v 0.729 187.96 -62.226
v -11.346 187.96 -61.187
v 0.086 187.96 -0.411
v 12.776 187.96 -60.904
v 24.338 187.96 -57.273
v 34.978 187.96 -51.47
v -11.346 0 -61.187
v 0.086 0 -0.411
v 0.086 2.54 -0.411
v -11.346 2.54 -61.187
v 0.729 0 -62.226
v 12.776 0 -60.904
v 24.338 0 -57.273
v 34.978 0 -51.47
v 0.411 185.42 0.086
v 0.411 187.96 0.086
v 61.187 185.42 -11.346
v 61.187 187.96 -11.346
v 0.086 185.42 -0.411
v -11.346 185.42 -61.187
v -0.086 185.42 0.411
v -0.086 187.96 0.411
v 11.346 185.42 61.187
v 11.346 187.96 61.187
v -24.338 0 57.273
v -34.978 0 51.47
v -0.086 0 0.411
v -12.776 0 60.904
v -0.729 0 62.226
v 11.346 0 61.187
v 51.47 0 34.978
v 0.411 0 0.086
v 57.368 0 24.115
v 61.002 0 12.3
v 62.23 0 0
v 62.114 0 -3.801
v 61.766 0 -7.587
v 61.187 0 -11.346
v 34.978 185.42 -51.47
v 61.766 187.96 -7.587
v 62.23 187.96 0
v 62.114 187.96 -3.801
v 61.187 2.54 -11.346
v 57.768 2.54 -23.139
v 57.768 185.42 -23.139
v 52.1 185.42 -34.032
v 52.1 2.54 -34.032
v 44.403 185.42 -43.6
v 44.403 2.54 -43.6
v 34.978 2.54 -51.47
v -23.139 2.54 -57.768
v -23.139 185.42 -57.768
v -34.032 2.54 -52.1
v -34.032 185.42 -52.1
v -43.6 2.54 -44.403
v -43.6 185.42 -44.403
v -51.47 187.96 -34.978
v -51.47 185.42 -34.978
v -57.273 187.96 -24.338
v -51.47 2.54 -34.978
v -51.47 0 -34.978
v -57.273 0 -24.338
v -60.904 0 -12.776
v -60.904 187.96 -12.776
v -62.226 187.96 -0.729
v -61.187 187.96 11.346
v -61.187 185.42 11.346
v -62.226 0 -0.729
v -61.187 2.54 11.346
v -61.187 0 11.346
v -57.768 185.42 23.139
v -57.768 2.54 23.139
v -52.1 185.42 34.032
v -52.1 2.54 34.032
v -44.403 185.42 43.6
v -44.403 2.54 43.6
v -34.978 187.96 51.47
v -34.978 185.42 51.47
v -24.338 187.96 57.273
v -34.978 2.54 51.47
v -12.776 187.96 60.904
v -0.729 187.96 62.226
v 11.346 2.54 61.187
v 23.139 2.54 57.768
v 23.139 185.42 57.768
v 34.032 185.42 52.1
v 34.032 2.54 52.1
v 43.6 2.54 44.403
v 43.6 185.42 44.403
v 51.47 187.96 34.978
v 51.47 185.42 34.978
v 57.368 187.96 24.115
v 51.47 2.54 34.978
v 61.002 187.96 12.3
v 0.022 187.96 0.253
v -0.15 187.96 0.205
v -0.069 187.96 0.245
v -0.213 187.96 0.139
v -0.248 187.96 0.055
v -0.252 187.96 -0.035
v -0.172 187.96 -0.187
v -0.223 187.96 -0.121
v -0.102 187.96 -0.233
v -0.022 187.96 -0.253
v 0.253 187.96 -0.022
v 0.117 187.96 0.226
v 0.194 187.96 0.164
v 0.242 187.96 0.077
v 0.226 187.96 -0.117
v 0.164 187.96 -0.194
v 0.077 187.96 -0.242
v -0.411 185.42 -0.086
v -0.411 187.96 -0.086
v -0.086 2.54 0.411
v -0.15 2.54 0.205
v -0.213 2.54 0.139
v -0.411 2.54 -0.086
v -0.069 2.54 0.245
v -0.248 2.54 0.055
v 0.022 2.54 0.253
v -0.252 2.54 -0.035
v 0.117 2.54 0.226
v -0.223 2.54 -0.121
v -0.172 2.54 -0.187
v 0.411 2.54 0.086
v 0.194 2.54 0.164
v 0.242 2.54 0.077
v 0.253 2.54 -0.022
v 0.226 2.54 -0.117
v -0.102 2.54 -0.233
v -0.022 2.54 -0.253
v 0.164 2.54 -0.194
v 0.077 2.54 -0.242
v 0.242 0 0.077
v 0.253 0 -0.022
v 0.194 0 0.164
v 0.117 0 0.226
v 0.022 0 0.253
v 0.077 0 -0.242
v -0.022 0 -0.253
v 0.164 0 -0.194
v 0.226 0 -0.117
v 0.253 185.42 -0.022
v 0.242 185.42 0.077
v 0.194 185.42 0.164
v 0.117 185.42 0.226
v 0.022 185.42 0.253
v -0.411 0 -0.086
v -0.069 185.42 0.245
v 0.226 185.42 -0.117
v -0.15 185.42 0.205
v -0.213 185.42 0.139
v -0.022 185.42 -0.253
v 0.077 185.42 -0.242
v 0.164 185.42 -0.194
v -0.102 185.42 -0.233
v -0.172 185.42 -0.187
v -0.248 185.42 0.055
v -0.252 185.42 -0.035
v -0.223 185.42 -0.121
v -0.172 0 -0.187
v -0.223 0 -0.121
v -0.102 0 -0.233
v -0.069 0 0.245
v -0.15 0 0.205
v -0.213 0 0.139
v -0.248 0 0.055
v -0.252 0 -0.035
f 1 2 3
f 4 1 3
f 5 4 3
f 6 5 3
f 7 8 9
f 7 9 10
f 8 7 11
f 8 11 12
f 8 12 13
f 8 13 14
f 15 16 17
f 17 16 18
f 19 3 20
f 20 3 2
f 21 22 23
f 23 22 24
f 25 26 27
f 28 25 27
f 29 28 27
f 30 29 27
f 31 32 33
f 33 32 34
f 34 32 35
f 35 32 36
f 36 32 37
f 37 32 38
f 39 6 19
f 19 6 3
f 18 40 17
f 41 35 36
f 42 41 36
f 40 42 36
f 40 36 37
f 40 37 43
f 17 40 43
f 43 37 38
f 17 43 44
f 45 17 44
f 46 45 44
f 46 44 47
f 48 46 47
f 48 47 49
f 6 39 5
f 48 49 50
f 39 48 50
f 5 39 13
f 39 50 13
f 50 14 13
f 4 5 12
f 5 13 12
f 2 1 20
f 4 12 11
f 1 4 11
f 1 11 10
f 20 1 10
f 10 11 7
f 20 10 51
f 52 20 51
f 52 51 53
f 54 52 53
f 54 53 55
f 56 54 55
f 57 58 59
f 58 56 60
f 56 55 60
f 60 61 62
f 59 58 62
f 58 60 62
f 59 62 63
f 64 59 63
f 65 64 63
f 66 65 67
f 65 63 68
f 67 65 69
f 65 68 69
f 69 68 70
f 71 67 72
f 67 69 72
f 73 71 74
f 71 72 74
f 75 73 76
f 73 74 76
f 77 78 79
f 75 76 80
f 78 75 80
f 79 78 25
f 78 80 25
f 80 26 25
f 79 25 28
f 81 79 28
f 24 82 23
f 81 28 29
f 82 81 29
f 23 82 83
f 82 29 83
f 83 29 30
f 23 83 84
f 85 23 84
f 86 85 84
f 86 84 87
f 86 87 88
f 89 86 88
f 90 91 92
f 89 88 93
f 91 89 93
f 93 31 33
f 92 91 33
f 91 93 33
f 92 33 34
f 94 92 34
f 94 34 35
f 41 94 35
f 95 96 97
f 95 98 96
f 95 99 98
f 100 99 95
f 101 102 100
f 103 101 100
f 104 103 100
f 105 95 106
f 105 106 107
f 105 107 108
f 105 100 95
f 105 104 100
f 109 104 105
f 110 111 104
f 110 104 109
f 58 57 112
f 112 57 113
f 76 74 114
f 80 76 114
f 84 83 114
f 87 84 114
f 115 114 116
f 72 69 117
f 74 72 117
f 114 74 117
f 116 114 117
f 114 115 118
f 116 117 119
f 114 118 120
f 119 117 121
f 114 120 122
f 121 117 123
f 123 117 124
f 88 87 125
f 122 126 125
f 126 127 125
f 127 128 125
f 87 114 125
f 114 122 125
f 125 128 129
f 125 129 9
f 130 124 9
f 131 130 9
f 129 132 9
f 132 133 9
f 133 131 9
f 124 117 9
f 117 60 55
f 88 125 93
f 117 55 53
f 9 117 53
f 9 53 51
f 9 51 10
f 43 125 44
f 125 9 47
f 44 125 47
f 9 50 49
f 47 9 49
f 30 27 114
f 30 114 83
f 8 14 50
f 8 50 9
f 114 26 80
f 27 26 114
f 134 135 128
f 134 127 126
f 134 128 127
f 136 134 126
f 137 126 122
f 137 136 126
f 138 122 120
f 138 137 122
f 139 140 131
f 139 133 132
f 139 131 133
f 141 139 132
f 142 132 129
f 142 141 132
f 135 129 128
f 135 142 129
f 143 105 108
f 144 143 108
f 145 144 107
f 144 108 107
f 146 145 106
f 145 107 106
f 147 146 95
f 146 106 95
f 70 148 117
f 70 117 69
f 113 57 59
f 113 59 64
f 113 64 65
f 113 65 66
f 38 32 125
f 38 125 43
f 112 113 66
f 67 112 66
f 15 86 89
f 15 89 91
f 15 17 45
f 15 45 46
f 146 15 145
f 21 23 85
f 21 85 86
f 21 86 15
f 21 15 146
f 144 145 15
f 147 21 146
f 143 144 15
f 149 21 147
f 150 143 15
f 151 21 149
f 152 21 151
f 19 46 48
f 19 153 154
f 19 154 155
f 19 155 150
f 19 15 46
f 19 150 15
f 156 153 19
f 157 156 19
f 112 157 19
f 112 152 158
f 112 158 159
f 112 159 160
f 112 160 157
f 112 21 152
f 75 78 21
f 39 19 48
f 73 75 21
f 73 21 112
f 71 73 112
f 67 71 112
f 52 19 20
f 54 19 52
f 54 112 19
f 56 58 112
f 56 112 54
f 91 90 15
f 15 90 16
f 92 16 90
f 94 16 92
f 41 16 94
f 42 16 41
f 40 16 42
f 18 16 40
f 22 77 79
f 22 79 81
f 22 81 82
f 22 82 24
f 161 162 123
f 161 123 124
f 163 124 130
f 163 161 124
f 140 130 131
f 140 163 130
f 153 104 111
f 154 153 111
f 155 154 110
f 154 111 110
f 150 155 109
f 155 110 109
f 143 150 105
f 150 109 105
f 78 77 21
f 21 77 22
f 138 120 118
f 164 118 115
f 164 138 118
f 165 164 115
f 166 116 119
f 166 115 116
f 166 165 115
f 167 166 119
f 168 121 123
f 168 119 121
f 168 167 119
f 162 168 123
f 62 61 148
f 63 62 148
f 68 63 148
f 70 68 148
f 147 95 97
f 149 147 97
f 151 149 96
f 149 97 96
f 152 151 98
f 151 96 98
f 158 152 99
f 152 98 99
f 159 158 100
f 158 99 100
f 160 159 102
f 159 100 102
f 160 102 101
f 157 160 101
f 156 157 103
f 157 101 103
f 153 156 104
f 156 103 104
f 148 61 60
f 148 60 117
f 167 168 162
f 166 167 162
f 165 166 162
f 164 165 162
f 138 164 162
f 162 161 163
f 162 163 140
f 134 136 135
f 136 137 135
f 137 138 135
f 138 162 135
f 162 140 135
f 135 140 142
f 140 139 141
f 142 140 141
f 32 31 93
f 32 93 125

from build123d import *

# Parameters (mm, degrees)
SKETCH1_R            = 62.23
BOSS_EXTRUDE1_DEPTH  = 187.96
CUT_EXTRUDE7_DEPTH   = 2.54
CIRPATTERN2_COUNT    = 4
MIRROR1_COPY_1_DEPTH = 2.54
MIRROR1_COPY_2_DEPTH = 2.54
MIRROR1_COPY_3_DEPTH = 2.54


with BuildPart() as part:
    # Sketch1 → Boss-Extrude1 (new body)
    with BuildSketch(Plane(origin=(0, 0, 0), x_dir=(1, 0, 0), z_dir=(0, 1, 0))):
        Circle(SKETCH1_R)
    extrude(amount=BOSS_EXTRUDE1_DEPTH)

    # Sketch2 → Cut-Extrude7 (cut)
    with BuildSketch(Plane(origin=(0, 187.96, 0), x_dir=(1, 0, 0), z_dir=(0, 1, 0))):
        with BuildLine():
            Line((-34.977816307, -51.46965384), (0.021593035, -0.253080503))
            ThreePointArc((0.021593035, -0.253080503), (-0.212652586, -0.138906004), (-0.223069042, 0.12147511))
            Line((-0.223069042, 0.12147511), (-61.186975042, -11.345791522))
            ThreePointArc((-61.186975042, -11.345791522), (-52.099883451, -34.031970915), (-34.977816307, -51.46965384))
        make_face()
    cut_extrude7 = extrude(amount=-CUT_EXTRUDE7_DEPTH, mode=Mode.SUBTRACT)

    # CirPattern2: Cut-Extrude7 ×4 about axis
    cirpattern2_axis = Axis((0, 0, 0), (0, 1, 0))
    for i in range(1, CIRPATTERN2_COUNT):
        add(cut_extrude7.rotate(cirpattern2_axis, i * 360 / CIRPATTERN2_COUNT), mode=Mode.SUBTRACT)

    # Mirror1: Cut-Extrude7 across plane
    add(cut_extrude7.mirror(Plane.ZX.offset(93.98)), mode=Mode.SUBTRACT)

    # Mirror1 copy 1 sketch → Mirror1 copy 1 (cut)
    with BuildSketch(Plane(origin=(0, 0, 0), x_dir=(0, 0, -1), z_dir=(0, -1, 0))):
        with BuildLine():
            Line((-34.977816307, 51.46965384), (0.021593035, 0.253080503))
            ThreePointArc((0.021593035, 0.253080503), (-0.212652586, 0.138906004), (-0.223069042, -0.12147511))
            Line((-0.223069042, -0.12147511), (-61.186975042, 11.345791522))
            ThreePointArc((-61.186975042, 11.345791522), (-52.099883451, 34.031970915), (-34.977816307, 51.46965384))
        make_face()
    extrude(amount=-MIRROR1_COPY_1_DEPTH, mode=Mode.SUBTRACT)

    # Mirror1 copy 2 sketch → Mirror1 copy 2 (cut)
    with BuildSketch(Plane(origin=(0, 0, 0), x_dir=(-1, 0, 0), z_dir=(0, -1, 0))):
        with BuildLine():
            Line((-34.977816307, 51.46965384), (0.021593035, 0.253080503))
            ThreePointArc((0.021593035, 0.253080503), (-0.212652586, 0.138906004), (-0.223069042, -0.12147511))
            Line((-0.223069042, -0.12147511), (-61.186975042, 11.345791522))
            ThreePointArc((-61.186975042, 11.345791522), (-52.099883451, 34.031970915), (-34.977816307, 51.46965384))
        make_face()
    extrude(amount=-MIRROR1_COPY_2_DEPTH, mode=Mode.SUBTRACT)

    # Mirror1 copy 3 sketch → Mirror1 copy 3 (cut)
    with BuildSketch(Plane(origin=(0, 0, 0), x_dir=(0, 0, 1), z_dir=(0, -1, 0))):
        with BuildLine():
            Line((-34.977816307, 51.46965384), (0.021593035, 0.253080503))
            ThreePointArc((0.021593035, 0.253080503), (-0.212652586, 0.138906004), (-0.223069042, -0.12147511))
            Line((-0.223069042, -0.12147511), (-61.186975042, 11.345791522))
            ThreePointArc((-61.186975042, 11.345791522), (-52.099883451, 34.031970915), (-34.977816307, 51.46965384))
        make_face()
    extrude(amount=-MIRROR1_COPY_3_DEPTH, mode=Mode.SUBTRACT)


solid = part.part
